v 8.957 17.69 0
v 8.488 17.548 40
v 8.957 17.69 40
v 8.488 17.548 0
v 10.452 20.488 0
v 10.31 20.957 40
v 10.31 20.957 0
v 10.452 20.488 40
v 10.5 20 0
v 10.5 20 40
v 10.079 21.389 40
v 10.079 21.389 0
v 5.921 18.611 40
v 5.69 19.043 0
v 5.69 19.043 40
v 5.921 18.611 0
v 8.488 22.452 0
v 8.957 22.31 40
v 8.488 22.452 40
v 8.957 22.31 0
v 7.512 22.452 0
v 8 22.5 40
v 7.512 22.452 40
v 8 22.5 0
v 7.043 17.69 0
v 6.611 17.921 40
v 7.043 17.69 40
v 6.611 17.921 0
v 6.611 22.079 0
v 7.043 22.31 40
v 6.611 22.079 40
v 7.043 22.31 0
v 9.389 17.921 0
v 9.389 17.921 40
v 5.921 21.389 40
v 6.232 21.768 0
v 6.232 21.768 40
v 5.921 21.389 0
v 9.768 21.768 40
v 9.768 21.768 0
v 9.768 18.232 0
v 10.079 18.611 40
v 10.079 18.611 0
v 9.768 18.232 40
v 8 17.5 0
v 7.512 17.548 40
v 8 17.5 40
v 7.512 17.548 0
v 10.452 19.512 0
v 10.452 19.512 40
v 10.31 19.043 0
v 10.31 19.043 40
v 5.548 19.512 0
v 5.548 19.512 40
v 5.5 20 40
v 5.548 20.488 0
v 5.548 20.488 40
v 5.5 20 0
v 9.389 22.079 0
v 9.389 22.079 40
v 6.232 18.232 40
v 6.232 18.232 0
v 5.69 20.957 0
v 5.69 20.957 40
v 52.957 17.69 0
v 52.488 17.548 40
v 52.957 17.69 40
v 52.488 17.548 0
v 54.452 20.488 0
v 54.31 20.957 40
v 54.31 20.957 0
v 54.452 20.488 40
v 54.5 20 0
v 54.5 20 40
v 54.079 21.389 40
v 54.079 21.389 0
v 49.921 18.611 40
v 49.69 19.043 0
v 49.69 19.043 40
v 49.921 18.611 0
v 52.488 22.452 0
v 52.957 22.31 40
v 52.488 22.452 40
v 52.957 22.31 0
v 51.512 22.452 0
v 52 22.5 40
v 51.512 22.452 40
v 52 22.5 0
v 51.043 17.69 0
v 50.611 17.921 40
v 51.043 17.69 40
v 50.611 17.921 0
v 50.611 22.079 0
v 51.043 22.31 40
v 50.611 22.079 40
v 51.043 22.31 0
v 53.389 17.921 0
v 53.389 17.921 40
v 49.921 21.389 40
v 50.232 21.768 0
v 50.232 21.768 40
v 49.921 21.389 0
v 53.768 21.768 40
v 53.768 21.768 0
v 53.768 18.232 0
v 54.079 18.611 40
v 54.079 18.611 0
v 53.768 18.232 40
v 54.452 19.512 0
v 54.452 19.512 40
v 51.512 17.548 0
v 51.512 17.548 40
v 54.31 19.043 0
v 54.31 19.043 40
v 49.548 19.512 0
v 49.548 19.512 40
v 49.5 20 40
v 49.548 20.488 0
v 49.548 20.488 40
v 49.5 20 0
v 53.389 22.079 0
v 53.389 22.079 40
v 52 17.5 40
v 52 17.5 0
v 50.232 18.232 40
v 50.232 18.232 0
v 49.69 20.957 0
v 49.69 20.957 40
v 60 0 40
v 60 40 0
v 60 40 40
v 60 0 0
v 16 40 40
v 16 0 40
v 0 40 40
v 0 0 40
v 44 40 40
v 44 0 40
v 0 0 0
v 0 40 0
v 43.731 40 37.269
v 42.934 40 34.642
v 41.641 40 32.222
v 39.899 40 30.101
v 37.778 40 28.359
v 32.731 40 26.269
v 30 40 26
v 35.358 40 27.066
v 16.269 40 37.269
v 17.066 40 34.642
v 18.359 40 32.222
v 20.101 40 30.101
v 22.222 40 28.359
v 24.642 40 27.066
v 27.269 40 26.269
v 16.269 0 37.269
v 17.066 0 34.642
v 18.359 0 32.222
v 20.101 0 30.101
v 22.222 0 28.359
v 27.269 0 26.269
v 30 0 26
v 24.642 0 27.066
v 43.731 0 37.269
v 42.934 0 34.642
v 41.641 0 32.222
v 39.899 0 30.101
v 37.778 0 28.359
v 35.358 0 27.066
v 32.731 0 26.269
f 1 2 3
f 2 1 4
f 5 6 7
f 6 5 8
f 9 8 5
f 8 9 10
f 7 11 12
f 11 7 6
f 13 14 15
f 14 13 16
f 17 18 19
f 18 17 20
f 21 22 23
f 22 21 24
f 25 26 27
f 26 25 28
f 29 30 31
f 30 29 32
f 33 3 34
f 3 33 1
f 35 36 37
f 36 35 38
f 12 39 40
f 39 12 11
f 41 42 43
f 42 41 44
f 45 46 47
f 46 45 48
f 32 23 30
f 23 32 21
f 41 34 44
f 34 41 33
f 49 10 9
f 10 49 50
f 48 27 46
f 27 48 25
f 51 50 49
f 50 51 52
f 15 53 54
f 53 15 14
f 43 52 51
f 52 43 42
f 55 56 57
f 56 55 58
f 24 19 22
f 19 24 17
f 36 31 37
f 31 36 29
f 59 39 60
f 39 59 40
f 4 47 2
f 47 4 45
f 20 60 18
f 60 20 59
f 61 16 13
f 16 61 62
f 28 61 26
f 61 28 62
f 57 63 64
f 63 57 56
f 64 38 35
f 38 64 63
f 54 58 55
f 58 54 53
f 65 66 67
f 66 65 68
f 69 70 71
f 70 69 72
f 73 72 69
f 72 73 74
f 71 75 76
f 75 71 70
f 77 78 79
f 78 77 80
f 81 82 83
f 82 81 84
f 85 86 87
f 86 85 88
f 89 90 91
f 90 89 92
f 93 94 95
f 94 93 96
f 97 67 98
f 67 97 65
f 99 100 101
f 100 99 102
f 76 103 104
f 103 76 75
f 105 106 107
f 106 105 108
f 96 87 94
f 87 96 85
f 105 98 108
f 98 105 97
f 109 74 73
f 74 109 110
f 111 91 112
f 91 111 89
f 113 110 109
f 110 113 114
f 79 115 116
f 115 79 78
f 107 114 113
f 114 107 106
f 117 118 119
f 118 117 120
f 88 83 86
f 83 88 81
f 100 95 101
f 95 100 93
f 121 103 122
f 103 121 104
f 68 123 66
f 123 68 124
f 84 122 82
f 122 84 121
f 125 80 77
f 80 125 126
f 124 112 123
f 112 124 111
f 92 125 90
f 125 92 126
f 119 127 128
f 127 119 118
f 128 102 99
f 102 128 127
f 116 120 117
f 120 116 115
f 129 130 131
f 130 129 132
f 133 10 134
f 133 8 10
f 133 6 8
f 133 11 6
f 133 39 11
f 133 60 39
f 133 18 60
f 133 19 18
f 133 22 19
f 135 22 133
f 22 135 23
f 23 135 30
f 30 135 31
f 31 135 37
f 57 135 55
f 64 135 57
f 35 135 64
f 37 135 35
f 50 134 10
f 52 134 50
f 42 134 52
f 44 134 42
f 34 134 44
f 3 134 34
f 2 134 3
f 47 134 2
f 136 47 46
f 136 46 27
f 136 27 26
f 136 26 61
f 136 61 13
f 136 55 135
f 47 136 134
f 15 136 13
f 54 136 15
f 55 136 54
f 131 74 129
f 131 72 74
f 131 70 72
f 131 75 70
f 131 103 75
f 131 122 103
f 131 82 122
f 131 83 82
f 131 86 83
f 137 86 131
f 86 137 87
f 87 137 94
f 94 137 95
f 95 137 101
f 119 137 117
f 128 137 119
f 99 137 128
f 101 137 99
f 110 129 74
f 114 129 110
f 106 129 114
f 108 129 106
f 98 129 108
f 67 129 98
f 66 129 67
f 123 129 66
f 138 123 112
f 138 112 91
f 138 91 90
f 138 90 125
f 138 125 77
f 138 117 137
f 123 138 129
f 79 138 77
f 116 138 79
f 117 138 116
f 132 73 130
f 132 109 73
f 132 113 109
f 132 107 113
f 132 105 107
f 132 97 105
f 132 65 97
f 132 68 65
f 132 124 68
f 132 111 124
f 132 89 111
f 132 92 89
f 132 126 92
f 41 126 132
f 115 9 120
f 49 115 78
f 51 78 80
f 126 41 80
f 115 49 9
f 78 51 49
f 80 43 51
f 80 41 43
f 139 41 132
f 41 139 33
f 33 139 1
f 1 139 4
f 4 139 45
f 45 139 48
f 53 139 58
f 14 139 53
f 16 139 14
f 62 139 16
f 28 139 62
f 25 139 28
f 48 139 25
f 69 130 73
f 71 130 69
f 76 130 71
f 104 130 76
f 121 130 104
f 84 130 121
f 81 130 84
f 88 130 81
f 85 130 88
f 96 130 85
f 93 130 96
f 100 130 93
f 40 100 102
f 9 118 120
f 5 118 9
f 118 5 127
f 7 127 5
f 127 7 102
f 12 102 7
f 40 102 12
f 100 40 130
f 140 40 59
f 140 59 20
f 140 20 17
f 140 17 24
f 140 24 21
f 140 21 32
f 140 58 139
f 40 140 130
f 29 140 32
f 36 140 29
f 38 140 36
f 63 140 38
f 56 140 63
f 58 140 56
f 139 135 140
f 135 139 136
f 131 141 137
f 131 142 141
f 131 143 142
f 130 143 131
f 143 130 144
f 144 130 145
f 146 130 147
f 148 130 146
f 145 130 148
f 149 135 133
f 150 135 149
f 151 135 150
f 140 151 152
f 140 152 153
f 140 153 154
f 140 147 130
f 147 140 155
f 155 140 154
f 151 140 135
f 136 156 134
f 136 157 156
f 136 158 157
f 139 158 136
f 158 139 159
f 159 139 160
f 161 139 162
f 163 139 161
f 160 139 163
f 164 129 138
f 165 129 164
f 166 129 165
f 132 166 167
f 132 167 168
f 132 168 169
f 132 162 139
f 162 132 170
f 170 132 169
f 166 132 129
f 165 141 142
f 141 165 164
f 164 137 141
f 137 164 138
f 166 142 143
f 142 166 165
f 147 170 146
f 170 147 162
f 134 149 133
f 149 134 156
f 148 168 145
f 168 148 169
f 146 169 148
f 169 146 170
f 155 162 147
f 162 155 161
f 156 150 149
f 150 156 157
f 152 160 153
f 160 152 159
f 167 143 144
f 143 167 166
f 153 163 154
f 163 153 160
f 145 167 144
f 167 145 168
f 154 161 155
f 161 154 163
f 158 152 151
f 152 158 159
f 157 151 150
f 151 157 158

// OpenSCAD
$fn = 32;

// ----------------------------------------------------------------------
// Saddle clamp: plain shaft clamp
// ----------------------------------------------------------------------

// --- parameters (mm) ---
blk_l = 60;               // block length, X
blk_w = 40;               // block width, Y
blk_h = 40;               // block height
clamp_r = 14;             // shaft groove radius
hole_r = 2.5;             // bolt hole radius
hole_m = 8;               // bolt hole margin from the ends

saw_depth = clamp_r + 3;  // saw kerf depth

difference() {
  cube([blk_l, blk_w, blk_h]);
  translate([blk_l / 2, -1, blk_h])
    rotate([-90, 0, 0])
      cylinder(h = blk_w + 2, r = clamp_r);
  for (sx = [0, 1])
    translate([sx ? blk_l - hole_m : hole_m, blk_w / 2, -1])
      cylinder(r = hole_r, h = blk_h + 2);
}
